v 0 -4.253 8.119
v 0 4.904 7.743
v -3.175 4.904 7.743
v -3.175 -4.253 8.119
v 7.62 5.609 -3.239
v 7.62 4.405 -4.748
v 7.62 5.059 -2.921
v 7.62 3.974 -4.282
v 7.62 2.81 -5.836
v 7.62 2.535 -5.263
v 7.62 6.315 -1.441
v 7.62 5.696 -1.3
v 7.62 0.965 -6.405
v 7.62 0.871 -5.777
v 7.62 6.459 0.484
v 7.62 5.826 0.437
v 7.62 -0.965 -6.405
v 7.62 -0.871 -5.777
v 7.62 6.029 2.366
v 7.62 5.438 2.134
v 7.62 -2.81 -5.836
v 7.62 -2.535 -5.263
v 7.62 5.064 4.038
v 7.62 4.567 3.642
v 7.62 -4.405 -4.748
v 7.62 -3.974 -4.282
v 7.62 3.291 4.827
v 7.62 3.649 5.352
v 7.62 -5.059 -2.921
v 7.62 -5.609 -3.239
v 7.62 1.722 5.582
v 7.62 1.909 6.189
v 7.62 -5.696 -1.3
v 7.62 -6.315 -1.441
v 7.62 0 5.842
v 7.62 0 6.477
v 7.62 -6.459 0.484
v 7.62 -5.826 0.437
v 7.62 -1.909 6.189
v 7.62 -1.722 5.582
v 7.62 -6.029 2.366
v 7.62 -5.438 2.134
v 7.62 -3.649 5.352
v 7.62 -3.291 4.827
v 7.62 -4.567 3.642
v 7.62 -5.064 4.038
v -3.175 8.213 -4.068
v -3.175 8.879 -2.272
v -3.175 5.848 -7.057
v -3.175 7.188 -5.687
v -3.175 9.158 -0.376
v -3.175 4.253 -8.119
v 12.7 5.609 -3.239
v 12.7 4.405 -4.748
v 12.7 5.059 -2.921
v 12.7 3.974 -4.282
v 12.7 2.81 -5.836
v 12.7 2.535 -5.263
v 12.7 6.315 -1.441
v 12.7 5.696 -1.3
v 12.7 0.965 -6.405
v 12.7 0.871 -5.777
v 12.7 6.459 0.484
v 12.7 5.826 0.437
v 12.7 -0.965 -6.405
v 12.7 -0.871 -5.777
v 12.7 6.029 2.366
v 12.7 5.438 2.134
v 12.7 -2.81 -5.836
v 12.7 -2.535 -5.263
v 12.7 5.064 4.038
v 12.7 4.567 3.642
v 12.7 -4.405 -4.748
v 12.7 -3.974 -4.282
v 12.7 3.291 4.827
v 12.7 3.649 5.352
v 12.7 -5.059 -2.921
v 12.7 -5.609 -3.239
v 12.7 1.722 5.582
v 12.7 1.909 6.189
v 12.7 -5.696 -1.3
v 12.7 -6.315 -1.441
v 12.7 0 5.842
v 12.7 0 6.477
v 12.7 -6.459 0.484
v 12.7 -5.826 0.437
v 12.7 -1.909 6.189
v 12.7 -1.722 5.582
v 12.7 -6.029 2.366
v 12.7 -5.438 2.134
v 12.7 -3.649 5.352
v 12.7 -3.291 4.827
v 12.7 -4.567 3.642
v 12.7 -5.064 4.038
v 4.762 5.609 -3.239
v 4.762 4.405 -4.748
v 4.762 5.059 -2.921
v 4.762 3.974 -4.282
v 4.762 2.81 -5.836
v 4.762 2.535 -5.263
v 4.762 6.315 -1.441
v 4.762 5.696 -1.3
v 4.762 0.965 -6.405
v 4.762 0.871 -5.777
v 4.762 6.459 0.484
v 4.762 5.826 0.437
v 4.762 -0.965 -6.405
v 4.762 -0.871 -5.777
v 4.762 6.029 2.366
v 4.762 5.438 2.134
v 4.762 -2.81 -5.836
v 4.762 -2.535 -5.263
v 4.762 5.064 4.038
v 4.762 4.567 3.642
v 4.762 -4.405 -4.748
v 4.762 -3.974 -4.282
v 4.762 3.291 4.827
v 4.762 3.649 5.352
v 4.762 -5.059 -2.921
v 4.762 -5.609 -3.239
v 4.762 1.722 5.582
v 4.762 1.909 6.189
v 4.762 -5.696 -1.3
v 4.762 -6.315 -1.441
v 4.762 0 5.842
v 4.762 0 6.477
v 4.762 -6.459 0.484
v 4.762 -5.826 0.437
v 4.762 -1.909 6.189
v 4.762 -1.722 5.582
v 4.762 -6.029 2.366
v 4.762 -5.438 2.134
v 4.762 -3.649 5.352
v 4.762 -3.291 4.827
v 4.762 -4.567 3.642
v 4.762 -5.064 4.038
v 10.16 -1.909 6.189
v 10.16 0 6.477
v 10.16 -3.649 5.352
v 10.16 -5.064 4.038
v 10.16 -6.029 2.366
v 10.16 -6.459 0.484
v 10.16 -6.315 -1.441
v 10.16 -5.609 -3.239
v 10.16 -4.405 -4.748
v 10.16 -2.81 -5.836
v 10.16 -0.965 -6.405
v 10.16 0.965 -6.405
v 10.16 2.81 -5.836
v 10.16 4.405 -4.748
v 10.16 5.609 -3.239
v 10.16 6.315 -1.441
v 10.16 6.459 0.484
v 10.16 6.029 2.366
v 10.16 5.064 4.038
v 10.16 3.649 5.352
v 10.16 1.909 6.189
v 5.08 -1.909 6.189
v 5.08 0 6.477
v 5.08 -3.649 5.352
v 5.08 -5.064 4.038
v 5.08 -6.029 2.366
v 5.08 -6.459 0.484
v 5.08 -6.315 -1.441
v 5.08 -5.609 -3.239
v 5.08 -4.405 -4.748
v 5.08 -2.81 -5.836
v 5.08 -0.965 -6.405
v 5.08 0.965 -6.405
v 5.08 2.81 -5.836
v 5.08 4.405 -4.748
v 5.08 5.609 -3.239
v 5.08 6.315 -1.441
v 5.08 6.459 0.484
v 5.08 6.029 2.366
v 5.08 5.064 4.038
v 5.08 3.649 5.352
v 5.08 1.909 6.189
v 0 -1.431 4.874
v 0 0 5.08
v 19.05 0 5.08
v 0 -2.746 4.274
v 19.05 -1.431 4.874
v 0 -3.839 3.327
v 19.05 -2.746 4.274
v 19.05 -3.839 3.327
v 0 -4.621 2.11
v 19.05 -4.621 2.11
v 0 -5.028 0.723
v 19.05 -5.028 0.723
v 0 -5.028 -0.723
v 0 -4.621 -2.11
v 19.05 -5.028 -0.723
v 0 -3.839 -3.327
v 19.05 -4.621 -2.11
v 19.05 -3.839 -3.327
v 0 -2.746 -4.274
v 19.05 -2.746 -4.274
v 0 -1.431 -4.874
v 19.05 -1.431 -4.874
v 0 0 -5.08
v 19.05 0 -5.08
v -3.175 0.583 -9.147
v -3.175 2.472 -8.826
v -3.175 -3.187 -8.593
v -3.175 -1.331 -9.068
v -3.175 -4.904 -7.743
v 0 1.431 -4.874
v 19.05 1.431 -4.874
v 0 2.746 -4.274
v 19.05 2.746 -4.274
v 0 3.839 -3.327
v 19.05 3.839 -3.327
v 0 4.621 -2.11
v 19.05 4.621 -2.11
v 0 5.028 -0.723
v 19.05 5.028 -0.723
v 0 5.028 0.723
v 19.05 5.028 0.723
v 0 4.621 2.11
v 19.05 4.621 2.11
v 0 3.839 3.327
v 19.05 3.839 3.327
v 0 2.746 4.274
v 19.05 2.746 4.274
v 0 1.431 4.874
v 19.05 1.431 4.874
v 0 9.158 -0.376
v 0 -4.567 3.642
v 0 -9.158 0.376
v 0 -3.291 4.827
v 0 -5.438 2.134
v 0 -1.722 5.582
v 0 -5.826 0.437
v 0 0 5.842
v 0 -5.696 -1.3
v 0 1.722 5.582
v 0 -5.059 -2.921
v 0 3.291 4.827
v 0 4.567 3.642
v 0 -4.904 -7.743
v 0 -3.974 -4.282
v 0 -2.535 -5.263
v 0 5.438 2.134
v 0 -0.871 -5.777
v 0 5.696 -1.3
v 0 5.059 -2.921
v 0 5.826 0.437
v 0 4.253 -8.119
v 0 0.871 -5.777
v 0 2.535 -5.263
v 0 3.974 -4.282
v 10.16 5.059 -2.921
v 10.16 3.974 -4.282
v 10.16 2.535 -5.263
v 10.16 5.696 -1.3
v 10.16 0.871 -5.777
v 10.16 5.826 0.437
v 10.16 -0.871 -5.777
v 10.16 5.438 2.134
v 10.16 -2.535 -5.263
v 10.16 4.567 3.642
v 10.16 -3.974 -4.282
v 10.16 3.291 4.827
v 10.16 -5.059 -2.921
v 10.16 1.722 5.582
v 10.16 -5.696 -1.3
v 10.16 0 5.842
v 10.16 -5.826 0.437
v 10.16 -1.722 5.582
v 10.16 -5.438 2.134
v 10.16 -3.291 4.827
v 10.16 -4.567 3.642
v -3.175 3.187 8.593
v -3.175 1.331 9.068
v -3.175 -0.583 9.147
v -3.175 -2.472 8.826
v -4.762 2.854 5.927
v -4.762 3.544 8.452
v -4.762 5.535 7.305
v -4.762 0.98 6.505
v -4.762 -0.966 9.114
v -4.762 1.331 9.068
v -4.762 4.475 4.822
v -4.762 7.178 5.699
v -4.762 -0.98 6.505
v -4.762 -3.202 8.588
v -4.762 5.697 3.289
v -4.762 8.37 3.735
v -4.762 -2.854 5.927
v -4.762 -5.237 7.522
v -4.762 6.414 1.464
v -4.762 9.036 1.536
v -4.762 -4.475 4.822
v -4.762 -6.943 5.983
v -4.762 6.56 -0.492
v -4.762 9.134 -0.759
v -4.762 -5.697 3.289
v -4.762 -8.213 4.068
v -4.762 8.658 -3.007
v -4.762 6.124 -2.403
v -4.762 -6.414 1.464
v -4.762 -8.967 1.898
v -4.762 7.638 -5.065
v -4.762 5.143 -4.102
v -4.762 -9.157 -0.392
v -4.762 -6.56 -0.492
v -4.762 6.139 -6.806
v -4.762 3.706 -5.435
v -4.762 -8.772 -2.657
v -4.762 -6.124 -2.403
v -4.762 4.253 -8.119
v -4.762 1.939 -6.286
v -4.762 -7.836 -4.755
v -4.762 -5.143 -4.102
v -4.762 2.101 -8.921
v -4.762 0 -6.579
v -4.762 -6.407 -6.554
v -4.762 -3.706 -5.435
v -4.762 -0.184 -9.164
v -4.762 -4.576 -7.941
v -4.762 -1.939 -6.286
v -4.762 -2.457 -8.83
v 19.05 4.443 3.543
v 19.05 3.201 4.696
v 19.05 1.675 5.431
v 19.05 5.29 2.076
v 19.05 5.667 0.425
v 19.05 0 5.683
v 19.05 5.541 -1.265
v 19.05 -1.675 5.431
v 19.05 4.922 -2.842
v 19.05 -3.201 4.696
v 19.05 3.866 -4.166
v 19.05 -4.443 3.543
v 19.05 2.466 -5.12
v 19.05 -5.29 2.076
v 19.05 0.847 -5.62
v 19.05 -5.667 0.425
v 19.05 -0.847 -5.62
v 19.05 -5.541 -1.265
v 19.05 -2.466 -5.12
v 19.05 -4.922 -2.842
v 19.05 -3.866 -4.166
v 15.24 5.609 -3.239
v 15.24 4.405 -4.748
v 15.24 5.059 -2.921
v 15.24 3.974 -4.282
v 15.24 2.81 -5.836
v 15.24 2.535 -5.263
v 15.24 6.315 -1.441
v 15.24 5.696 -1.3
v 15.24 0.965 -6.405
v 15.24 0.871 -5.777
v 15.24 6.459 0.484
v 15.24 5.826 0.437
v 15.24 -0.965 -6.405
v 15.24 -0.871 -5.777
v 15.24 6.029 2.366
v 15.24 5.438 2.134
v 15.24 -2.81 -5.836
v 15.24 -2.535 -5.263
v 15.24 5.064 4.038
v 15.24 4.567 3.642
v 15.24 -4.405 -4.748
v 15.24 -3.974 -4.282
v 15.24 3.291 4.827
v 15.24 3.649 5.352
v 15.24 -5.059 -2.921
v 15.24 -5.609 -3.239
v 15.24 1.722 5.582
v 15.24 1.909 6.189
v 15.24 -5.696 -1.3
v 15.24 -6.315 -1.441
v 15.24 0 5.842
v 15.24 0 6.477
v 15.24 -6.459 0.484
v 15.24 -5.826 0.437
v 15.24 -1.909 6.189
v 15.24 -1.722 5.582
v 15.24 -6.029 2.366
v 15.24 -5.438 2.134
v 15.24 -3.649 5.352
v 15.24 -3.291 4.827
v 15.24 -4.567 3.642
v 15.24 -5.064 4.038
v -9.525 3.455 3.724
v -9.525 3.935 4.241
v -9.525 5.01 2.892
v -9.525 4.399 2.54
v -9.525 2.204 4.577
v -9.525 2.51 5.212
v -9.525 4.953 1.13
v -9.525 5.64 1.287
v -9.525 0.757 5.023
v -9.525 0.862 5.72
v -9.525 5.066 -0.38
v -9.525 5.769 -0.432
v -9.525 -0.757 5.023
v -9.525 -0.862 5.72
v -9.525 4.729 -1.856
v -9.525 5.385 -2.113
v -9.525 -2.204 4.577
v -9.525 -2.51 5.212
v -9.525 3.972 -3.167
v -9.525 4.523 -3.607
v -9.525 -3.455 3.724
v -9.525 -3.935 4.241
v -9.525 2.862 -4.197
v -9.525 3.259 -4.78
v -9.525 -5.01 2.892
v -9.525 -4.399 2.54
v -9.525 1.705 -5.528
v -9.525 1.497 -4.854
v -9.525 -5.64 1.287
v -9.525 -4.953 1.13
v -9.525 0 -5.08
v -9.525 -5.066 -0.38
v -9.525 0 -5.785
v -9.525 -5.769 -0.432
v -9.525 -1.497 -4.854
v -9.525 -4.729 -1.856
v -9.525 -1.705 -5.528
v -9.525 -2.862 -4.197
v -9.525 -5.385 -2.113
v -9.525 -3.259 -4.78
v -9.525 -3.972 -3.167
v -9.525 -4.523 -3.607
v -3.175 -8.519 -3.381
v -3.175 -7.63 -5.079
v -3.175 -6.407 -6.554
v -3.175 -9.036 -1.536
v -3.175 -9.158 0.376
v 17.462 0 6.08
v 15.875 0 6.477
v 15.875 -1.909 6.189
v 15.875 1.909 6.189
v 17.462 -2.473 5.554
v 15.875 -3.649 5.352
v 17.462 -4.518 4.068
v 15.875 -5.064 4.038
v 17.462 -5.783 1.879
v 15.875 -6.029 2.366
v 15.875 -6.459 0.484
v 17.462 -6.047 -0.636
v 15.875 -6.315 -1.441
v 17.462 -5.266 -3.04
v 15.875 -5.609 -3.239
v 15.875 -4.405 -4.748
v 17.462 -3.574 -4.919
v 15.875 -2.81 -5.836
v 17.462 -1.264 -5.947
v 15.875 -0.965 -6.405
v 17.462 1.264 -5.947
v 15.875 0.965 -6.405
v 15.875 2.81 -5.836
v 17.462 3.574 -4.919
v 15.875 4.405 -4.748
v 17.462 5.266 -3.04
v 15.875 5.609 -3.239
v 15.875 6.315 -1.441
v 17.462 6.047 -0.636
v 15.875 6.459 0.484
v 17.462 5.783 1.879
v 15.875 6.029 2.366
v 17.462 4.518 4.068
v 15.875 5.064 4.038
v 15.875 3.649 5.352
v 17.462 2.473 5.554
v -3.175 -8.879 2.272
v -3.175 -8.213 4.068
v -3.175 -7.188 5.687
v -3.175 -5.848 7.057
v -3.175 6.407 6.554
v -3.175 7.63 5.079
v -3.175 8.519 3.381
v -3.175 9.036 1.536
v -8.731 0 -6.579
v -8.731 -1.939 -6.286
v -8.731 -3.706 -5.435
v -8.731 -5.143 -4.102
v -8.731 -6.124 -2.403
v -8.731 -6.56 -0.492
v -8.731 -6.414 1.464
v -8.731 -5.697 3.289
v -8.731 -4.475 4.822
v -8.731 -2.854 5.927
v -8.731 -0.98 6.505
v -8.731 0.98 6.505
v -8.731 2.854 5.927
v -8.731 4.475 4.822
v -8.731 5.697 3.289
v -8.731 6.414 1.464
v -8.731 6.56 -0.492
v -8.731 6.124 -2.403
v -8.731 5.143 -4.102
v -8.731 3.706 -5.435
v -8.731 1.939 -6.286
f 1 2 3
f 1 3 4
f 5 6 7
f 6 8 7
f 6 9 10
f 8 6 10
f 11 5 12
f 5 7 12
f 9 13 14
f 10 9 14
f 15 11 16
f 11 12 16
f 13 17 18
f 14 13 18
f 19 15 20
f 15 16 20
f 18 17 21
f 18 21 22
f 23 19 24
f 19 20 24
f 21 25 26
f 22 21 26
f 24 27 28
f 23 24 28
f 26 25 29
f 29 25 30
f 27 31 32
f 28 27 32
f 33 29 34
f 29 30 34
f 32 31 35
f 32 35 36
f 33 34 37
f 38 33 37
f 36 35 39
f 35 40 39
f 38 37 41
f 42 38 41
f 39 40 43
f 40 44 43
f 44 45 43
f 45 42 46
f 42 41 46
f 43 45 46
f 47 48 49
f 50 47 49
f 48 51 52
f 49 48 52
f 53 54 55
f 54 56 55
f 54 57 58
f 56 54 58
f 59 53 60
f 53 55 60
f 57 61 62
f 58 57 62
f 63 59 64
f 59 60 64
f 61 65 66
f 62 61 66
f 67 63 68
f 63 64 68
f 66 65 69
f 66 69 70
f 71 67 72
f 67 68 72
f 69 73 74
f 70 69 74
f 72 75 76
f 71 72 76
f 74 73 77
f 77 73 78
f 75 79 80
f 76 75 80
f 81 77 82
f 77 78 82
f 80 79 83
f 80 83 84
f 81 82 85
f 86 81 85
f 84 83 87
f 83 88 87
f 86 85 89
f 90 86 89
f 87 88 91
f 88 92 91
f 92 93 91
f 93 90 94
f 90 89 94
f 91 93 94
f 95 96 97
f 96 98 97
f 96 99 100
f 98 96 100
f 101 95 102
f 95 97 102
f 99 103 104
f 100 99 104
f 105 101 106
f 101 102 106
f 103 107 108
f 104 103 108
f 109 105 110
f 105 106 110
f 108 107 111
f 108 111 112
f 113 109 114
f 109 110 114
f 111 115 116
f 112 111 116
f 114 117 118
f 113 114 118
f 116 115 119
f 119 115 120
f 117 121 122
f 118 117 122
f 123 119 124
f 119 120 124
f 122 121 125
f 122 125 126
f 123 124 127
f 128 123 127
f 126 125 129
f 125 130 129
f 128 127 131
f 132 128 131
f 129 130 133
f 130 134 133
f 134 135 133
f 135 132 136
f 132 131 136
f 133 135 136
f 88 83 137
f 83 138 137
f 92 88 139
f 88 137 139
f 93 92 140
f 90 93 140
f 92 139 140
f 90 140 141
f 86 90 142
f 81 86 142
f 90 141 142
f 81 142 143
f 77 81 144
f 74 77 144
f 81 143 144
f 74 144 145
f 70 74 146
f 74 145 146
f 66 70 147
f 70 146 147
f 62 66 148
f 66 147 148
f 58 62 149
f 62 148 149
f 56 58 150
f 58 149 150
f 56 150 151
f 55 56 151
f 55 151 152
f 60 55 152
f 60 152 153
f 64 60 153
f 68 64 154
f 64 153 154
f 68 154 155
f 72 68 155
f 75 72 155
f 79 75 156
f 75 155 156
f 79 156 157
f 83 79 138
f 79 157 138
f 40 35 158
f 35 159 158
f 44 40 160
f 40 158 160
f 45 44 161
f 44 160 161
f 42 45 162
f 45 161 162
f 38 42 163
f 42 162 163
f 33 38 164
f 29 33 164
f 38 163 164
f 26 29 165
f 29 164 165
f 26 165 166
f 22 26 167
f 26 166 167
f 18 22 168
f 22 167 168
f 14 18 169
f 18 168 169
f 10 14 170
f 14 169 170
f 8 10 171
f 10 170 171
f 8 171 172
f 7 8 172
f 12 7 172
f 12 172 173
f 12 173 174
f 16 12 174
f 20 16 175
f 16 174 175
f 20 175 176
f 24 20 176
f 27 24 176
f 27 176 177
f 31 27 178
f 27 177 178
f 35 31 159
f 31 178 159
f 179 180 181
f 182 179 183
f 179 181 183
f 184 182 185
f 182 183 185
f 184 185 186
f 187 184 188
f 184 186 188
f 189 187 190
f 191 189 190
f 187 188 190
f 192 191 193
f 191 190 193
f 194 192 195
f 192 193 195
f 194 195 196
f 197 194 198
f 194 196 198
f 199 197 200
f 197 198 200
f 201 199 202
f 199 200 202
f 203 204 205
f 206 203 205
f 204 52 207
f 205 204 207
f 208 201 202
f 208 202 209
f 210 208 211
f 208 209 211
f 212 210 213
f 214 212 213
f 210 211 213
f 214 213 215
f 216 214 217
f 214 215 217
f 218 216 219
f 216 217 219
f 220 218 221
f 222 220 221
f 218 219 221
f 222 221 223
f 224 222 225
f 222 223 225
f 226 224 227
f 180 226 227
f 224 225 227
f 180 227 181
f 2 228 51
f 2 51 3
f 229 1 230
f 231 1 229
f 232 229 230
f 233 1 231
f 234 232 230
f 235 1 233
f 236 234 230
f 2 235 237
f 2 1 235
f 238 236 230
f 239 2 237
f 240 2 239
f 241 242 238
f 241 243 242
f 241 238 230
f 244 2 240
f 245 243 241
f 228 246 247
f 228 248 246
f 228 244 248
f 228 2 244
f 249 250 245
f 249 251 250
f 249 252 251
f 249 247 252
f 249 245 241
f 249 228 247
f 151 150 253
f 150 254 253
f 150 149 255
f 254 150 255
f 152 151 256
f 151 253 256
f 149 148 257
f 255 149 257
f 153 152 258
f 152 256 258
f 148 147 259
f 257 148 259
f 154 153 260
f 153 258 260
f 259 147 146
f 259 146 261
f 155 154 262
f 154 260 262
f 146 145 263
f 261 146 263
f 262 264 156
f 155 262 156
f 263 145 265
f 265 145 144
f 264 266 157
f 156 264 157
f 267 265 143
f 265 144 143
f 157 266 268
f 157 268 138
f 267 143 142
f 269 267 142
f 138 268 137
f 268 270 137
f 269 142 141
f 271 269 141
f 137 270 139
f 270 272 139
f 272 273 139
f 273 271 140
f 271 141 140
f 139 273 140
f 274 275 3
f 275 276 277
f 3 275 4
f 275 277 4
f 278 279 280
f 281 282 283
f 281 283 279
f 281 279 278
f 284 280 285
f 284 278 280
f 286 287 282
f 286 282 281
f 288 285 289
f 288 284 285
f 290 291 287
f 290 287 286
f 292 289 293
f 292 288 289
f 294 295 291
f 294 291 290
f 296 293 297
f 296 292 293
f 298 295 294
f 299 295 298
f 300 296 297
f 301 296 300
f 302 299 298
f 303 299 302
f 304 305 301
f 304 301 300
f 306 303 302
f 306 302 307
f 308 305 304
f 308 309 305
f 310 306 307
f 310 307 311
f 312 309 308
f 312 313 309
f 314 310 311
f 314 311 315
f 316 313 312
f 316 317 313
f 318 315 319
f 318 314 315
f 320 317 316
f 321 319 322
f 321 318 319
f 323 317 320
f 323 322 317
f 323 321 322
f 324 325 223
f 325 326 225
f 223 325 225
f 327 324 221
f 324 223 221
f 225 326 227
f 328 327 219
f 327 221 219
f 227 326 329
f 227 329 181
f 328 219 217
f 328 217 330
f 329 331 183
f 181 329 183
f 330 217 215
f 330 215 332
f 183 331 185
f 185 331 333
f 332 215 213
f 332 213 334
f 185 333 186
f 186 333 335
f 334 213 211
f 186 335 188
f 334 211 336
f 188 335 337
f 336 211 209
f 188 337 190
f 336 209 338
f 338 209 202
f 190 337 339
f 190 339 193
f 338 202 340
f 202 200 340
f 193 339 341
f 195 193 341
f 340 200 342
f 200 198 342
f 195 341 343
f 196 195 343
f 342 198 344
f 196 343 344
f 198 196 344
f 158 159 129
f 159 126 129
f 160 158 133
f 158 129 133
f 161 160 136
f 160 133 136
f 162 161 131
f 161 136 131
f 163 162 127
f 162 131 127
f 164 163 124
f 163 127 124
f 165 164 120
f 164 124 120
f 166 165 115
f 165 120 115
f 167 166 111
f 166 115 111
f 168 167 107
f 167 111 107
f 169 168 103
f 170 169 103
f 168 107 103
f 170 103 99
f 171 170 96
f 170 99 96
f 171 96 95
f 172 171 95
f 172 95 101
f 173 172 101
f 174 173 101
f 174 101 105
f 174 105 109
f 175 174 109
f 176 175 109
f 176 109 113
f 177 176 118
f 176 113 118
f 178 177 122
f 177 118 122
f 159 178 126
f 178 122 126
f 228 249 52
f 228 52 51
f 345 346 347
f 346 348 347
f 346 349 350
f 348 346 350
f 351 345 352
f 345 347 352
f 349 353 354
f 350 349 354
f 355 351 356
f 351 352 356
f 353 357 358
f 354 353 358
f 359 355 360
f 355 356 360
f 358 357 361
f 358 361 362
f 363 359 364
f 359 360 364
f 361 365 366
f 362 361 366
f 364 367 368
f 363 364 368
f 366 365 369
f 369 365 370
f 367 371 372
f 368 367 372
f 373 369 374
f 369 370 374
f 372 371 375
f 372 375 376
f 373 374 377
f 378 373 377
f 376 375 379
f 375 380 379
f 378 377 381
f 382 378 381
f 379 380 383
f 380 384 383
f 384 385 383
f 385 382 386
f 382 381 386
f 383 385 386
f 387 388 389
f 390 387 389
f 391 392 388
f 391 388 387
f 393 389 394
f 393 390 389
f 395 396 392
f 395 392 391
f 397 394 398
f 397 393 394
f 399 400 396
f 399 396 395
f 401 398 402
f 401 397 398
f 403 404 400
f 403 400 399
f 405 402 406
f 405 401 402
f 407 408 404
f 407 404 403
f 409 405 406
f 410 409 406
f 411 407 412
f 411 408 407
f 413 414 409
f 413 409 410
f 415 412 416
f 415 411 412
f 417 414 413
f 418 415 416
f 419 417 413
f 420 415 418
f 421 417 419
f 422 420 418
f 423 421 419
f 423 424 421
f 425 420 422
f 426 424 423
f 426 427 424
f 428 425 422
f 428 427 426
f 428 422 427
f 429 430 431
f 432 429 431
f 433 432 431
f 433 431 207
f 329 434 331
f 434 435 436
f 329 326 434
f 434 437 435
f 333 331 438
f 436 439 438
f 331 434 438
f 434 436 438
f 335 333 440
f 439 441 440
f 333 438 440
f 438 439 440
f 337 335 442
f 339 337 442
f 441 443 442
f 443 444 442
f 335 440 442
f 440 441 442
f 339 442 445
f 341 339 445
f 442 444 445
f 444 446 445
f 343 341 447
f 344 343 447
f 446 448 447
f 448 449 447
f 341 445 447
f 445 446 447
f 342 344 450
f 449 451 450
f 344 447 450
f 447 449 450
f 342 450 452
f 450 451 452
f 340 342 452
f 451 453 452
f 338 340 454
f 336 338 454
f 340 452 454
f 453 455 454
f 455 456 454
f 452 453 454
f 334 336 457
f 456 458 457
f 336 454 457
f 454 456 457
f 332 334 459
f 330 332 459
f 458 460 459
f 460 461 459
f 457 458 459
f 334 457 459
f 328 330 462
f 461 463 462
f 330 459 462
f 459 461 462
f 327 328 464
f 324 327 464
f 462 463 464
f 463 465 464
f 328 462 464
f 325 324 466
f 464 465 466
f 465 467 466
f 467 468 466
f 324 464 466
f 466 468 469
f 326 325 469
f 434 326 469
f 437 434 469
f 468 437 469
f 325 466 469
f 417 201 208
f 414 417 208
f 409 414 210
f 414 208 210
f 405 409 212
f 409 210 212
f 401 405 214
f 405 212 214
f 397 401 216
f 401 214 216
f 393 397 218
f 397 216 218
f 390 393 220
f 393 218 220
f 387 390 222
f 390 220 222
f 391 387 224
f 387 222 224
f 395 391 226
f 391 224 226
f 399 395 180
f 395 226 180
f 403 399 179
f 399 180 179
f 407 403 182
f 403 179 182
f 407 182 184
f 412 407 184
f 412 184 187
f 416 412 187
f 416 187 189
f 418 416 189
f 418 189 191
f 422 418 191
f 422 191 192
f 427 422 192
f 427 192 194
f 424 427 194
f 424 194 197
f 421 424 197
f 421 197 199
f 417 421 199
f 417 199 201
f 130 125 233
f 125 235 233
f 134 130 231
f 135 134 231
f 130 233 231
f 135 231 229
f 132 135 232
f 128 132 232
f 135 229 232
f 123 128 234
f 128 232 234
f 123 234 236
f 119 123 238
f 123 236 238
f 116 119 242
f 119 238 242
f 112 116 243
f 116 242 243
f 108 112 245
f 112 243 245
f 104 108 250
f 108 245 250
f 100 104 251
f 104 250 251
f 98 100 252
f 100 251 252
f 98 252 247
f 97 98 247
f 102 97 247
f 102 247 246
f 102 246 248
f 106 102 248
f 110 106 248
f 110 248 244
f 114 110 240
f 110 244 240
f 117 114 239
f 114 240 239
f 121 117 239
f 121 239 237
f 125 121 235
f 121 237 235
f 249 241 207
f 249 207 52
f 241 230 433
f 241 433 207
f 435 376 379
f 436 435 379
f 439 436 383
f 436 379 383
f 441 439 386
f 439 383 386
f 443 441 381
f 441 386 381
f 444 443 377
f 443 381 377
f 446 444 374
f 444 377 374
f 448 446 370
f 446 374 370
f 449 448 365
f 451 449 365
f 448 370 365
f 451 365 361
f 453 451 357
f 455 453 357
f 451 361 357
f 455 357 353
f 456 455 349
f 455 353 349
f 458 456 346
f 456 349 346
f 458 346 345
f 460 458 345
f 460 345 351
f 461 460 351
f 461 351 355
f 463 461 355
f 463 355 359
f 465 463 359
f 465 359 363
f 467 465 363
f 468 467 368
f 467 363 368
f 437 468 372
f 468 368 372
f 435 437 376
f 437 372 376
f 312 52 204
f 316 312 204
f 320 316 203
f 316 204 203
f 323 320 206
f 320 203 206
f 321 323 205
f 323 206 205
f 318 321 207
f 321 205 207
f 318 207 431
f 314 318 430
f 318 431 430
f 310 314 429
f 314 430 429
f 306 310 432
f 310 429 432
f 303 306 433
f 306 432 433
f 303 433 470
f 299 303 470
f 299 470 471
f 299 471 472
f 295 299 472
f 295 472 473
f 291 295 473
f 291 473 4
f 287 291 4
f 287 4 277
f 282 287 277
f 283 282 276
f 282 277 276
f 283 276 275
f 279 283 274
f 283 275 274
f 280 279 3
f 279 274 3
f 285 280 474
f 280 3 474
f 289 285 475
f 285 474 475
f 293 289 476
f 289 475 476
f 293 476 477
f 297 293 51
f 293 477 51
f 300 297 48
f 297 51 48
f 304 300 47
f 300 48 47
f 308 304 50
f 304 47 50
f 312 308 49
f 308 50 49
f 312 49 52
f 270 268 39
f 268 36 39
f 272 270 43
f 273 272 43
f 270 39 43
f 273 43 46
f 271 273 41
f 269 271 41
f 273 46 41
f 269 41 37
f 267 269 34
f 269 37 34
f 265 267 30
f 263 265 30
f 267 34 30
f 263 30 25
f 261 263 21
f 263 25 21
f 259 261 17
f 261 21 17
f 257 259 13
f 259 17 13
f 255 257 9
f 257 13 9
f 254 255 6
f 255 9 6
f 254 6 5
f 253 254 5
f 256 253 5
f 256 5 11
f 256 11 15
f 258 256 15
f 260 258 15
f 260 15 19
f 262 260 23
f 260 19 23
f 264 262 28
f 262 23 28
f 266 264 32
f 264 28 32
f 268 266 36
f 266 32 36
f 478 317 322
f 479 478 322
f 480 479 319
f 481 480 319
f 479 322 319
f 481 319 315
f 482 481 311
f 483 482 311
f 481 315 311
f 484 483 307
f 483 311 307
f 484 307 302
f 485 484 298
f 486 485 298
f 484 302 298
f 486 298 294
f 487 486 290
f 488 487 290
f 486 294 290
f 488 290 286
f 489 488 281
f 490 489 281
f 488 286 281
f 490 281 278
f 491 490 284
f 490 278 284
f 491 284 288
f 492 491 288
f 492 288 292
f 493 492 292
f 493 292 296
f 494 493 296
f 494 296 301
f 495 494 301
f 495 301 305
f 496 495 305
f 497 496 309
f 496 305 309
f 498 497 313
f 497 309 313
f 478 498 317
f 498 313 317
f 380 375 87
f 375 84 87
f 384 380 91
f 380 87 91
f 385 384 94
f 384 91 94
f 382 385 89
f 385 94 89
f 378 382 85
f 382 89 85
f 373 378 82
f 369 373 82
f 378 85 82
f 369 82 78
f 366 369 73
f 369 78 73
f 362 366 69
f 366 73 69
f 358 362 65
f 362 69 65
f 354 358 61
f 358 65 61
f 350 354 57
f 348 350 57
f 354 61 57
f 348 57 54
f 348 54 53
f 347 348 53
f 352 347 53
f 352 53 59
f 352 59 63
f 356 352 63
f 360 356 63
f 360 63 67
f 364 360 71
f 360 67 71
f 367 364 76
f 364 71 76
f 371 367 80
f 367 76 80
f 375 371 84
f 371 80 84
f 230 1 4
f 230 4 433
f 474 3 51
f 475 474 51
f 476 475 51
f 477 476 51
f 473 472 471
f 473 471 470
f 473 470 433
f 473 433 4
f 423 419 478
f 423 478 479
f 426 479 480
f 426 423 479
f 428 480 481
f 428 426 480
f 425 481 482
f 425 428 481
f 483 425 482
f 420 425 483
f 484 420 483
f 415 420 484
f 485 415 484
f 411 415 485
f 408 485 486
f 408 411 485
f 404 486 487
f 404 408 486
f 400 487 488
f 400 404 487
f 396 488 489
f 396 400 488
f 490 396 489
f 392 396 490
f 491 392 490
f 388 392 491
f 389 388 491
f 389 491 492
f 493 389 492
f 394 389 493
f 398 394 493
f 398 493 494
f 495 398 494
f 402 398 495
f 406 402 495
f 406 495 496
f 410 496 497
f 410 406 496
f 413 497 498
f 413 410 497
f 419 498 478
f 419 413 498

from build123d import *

# Parameters (mm, degrees)
CHAMFER1_SIZE    = 0.79375
CHAMFER1_SIZE2   = 3.175
EXTRUSION1_DEPTH = 3.175
ESQUISSE3_R      = 9.165435523
EXTRUSION2_DEPTH = 1.5875
ESQUISSE4_R      = 6.5786
THREAD1_DEPTH    = 4.7625
CHAMFER2_SIZE    = 0.79375
HOLE1_D          = 10.16


with BuildPart() as part:
    # Esquisse1 → Revolution1 (revolve)
    with BuildSketch(Plane.XY, mode=Mode.PRIVATE) as revolution1_sk:
        Polygon((0, 5.08), (19.05, 5.08), (19.05, 6.477), (15.24, 6.477), (15.24, 5.842), (12.7, 6.477), (12.7, 5.842), (10.16, 6.477), (10.16, 5.842), (7.62, 6.477), (7.62, 5.842), (5.08, 6.477), (4.7625, 6.477), (4.7625, 5.842), (0, 5.842), align=None)
    revolve(revolution1_sk.sketch.rotate(Axis((0, 0, 0), (1, 0, 0)), 90), axis=Axis((0, 0, 0), (1, 0, 0)))

    # Chamfer1
    chamfer1_edges = [part.edges().sort_by_distance(p)[0] for p in [
        (19.05, 0, -6.477),
    ]]
    chamfer1_side = [part.faces().sort_by_distance(p)[0] for p in [
        (19.05, 0, -5.263197225),
    ]]
    chamfer(chamfer1_edges, length=CHAMFER1_SIZE, length2=CHAMFER1_SIZE2, reference=chamfer1_side[0])

    # Esquisse2 → Extrusion1 (add)
    with BuildSketch(Plane.ZY):
        Polygon((0.375877143, -9.157724865), (-7.742883803, -4.904381587), (-8.118760946, 4.253343278), (-0.375877143, 9.157724865), (7.742883803, 4.904381587), (8.118760946, -4.253343278), align=None)
    extrude(amount=EXTRUSION1_DEPTH)

    # Esquisse3 → Extrusion2 (add)
    with BuildSketch(Plane.ZY.offset(3.175)):
        with Locations(Location((0, 0, 0), (0, 0, 152.350375514))):
            Circle(ESQUISSE3_R)
    extrude(amount=EXTRUSION2_DEPTH)

    # Esquisse4 → Thread1 (add)
    with BuildSketch(Plane.ZY.offset(4.7625)):
        with Locations(Location((0, 0, 0), (0, 0, 180))):
            Circle(ESQUISSE4_R)
    extrude(amount=THREAD1_DEPTH)

    # Chamfer2
    chamfer2_edges = [part.edges().sort_by_distance(p)[0] for p in [
        (-9.525, 0, 6.5786),
    ]]
    chamfer(chamfer2_edges, length=CHAMFER2_SIZE)

    # Hole1 (through all)
    with Locations(Plane.ZY.offset(9.525)):
        with Locations((0, 0)):
            Hole(HOLE1_D / 2)


solid = part.part
